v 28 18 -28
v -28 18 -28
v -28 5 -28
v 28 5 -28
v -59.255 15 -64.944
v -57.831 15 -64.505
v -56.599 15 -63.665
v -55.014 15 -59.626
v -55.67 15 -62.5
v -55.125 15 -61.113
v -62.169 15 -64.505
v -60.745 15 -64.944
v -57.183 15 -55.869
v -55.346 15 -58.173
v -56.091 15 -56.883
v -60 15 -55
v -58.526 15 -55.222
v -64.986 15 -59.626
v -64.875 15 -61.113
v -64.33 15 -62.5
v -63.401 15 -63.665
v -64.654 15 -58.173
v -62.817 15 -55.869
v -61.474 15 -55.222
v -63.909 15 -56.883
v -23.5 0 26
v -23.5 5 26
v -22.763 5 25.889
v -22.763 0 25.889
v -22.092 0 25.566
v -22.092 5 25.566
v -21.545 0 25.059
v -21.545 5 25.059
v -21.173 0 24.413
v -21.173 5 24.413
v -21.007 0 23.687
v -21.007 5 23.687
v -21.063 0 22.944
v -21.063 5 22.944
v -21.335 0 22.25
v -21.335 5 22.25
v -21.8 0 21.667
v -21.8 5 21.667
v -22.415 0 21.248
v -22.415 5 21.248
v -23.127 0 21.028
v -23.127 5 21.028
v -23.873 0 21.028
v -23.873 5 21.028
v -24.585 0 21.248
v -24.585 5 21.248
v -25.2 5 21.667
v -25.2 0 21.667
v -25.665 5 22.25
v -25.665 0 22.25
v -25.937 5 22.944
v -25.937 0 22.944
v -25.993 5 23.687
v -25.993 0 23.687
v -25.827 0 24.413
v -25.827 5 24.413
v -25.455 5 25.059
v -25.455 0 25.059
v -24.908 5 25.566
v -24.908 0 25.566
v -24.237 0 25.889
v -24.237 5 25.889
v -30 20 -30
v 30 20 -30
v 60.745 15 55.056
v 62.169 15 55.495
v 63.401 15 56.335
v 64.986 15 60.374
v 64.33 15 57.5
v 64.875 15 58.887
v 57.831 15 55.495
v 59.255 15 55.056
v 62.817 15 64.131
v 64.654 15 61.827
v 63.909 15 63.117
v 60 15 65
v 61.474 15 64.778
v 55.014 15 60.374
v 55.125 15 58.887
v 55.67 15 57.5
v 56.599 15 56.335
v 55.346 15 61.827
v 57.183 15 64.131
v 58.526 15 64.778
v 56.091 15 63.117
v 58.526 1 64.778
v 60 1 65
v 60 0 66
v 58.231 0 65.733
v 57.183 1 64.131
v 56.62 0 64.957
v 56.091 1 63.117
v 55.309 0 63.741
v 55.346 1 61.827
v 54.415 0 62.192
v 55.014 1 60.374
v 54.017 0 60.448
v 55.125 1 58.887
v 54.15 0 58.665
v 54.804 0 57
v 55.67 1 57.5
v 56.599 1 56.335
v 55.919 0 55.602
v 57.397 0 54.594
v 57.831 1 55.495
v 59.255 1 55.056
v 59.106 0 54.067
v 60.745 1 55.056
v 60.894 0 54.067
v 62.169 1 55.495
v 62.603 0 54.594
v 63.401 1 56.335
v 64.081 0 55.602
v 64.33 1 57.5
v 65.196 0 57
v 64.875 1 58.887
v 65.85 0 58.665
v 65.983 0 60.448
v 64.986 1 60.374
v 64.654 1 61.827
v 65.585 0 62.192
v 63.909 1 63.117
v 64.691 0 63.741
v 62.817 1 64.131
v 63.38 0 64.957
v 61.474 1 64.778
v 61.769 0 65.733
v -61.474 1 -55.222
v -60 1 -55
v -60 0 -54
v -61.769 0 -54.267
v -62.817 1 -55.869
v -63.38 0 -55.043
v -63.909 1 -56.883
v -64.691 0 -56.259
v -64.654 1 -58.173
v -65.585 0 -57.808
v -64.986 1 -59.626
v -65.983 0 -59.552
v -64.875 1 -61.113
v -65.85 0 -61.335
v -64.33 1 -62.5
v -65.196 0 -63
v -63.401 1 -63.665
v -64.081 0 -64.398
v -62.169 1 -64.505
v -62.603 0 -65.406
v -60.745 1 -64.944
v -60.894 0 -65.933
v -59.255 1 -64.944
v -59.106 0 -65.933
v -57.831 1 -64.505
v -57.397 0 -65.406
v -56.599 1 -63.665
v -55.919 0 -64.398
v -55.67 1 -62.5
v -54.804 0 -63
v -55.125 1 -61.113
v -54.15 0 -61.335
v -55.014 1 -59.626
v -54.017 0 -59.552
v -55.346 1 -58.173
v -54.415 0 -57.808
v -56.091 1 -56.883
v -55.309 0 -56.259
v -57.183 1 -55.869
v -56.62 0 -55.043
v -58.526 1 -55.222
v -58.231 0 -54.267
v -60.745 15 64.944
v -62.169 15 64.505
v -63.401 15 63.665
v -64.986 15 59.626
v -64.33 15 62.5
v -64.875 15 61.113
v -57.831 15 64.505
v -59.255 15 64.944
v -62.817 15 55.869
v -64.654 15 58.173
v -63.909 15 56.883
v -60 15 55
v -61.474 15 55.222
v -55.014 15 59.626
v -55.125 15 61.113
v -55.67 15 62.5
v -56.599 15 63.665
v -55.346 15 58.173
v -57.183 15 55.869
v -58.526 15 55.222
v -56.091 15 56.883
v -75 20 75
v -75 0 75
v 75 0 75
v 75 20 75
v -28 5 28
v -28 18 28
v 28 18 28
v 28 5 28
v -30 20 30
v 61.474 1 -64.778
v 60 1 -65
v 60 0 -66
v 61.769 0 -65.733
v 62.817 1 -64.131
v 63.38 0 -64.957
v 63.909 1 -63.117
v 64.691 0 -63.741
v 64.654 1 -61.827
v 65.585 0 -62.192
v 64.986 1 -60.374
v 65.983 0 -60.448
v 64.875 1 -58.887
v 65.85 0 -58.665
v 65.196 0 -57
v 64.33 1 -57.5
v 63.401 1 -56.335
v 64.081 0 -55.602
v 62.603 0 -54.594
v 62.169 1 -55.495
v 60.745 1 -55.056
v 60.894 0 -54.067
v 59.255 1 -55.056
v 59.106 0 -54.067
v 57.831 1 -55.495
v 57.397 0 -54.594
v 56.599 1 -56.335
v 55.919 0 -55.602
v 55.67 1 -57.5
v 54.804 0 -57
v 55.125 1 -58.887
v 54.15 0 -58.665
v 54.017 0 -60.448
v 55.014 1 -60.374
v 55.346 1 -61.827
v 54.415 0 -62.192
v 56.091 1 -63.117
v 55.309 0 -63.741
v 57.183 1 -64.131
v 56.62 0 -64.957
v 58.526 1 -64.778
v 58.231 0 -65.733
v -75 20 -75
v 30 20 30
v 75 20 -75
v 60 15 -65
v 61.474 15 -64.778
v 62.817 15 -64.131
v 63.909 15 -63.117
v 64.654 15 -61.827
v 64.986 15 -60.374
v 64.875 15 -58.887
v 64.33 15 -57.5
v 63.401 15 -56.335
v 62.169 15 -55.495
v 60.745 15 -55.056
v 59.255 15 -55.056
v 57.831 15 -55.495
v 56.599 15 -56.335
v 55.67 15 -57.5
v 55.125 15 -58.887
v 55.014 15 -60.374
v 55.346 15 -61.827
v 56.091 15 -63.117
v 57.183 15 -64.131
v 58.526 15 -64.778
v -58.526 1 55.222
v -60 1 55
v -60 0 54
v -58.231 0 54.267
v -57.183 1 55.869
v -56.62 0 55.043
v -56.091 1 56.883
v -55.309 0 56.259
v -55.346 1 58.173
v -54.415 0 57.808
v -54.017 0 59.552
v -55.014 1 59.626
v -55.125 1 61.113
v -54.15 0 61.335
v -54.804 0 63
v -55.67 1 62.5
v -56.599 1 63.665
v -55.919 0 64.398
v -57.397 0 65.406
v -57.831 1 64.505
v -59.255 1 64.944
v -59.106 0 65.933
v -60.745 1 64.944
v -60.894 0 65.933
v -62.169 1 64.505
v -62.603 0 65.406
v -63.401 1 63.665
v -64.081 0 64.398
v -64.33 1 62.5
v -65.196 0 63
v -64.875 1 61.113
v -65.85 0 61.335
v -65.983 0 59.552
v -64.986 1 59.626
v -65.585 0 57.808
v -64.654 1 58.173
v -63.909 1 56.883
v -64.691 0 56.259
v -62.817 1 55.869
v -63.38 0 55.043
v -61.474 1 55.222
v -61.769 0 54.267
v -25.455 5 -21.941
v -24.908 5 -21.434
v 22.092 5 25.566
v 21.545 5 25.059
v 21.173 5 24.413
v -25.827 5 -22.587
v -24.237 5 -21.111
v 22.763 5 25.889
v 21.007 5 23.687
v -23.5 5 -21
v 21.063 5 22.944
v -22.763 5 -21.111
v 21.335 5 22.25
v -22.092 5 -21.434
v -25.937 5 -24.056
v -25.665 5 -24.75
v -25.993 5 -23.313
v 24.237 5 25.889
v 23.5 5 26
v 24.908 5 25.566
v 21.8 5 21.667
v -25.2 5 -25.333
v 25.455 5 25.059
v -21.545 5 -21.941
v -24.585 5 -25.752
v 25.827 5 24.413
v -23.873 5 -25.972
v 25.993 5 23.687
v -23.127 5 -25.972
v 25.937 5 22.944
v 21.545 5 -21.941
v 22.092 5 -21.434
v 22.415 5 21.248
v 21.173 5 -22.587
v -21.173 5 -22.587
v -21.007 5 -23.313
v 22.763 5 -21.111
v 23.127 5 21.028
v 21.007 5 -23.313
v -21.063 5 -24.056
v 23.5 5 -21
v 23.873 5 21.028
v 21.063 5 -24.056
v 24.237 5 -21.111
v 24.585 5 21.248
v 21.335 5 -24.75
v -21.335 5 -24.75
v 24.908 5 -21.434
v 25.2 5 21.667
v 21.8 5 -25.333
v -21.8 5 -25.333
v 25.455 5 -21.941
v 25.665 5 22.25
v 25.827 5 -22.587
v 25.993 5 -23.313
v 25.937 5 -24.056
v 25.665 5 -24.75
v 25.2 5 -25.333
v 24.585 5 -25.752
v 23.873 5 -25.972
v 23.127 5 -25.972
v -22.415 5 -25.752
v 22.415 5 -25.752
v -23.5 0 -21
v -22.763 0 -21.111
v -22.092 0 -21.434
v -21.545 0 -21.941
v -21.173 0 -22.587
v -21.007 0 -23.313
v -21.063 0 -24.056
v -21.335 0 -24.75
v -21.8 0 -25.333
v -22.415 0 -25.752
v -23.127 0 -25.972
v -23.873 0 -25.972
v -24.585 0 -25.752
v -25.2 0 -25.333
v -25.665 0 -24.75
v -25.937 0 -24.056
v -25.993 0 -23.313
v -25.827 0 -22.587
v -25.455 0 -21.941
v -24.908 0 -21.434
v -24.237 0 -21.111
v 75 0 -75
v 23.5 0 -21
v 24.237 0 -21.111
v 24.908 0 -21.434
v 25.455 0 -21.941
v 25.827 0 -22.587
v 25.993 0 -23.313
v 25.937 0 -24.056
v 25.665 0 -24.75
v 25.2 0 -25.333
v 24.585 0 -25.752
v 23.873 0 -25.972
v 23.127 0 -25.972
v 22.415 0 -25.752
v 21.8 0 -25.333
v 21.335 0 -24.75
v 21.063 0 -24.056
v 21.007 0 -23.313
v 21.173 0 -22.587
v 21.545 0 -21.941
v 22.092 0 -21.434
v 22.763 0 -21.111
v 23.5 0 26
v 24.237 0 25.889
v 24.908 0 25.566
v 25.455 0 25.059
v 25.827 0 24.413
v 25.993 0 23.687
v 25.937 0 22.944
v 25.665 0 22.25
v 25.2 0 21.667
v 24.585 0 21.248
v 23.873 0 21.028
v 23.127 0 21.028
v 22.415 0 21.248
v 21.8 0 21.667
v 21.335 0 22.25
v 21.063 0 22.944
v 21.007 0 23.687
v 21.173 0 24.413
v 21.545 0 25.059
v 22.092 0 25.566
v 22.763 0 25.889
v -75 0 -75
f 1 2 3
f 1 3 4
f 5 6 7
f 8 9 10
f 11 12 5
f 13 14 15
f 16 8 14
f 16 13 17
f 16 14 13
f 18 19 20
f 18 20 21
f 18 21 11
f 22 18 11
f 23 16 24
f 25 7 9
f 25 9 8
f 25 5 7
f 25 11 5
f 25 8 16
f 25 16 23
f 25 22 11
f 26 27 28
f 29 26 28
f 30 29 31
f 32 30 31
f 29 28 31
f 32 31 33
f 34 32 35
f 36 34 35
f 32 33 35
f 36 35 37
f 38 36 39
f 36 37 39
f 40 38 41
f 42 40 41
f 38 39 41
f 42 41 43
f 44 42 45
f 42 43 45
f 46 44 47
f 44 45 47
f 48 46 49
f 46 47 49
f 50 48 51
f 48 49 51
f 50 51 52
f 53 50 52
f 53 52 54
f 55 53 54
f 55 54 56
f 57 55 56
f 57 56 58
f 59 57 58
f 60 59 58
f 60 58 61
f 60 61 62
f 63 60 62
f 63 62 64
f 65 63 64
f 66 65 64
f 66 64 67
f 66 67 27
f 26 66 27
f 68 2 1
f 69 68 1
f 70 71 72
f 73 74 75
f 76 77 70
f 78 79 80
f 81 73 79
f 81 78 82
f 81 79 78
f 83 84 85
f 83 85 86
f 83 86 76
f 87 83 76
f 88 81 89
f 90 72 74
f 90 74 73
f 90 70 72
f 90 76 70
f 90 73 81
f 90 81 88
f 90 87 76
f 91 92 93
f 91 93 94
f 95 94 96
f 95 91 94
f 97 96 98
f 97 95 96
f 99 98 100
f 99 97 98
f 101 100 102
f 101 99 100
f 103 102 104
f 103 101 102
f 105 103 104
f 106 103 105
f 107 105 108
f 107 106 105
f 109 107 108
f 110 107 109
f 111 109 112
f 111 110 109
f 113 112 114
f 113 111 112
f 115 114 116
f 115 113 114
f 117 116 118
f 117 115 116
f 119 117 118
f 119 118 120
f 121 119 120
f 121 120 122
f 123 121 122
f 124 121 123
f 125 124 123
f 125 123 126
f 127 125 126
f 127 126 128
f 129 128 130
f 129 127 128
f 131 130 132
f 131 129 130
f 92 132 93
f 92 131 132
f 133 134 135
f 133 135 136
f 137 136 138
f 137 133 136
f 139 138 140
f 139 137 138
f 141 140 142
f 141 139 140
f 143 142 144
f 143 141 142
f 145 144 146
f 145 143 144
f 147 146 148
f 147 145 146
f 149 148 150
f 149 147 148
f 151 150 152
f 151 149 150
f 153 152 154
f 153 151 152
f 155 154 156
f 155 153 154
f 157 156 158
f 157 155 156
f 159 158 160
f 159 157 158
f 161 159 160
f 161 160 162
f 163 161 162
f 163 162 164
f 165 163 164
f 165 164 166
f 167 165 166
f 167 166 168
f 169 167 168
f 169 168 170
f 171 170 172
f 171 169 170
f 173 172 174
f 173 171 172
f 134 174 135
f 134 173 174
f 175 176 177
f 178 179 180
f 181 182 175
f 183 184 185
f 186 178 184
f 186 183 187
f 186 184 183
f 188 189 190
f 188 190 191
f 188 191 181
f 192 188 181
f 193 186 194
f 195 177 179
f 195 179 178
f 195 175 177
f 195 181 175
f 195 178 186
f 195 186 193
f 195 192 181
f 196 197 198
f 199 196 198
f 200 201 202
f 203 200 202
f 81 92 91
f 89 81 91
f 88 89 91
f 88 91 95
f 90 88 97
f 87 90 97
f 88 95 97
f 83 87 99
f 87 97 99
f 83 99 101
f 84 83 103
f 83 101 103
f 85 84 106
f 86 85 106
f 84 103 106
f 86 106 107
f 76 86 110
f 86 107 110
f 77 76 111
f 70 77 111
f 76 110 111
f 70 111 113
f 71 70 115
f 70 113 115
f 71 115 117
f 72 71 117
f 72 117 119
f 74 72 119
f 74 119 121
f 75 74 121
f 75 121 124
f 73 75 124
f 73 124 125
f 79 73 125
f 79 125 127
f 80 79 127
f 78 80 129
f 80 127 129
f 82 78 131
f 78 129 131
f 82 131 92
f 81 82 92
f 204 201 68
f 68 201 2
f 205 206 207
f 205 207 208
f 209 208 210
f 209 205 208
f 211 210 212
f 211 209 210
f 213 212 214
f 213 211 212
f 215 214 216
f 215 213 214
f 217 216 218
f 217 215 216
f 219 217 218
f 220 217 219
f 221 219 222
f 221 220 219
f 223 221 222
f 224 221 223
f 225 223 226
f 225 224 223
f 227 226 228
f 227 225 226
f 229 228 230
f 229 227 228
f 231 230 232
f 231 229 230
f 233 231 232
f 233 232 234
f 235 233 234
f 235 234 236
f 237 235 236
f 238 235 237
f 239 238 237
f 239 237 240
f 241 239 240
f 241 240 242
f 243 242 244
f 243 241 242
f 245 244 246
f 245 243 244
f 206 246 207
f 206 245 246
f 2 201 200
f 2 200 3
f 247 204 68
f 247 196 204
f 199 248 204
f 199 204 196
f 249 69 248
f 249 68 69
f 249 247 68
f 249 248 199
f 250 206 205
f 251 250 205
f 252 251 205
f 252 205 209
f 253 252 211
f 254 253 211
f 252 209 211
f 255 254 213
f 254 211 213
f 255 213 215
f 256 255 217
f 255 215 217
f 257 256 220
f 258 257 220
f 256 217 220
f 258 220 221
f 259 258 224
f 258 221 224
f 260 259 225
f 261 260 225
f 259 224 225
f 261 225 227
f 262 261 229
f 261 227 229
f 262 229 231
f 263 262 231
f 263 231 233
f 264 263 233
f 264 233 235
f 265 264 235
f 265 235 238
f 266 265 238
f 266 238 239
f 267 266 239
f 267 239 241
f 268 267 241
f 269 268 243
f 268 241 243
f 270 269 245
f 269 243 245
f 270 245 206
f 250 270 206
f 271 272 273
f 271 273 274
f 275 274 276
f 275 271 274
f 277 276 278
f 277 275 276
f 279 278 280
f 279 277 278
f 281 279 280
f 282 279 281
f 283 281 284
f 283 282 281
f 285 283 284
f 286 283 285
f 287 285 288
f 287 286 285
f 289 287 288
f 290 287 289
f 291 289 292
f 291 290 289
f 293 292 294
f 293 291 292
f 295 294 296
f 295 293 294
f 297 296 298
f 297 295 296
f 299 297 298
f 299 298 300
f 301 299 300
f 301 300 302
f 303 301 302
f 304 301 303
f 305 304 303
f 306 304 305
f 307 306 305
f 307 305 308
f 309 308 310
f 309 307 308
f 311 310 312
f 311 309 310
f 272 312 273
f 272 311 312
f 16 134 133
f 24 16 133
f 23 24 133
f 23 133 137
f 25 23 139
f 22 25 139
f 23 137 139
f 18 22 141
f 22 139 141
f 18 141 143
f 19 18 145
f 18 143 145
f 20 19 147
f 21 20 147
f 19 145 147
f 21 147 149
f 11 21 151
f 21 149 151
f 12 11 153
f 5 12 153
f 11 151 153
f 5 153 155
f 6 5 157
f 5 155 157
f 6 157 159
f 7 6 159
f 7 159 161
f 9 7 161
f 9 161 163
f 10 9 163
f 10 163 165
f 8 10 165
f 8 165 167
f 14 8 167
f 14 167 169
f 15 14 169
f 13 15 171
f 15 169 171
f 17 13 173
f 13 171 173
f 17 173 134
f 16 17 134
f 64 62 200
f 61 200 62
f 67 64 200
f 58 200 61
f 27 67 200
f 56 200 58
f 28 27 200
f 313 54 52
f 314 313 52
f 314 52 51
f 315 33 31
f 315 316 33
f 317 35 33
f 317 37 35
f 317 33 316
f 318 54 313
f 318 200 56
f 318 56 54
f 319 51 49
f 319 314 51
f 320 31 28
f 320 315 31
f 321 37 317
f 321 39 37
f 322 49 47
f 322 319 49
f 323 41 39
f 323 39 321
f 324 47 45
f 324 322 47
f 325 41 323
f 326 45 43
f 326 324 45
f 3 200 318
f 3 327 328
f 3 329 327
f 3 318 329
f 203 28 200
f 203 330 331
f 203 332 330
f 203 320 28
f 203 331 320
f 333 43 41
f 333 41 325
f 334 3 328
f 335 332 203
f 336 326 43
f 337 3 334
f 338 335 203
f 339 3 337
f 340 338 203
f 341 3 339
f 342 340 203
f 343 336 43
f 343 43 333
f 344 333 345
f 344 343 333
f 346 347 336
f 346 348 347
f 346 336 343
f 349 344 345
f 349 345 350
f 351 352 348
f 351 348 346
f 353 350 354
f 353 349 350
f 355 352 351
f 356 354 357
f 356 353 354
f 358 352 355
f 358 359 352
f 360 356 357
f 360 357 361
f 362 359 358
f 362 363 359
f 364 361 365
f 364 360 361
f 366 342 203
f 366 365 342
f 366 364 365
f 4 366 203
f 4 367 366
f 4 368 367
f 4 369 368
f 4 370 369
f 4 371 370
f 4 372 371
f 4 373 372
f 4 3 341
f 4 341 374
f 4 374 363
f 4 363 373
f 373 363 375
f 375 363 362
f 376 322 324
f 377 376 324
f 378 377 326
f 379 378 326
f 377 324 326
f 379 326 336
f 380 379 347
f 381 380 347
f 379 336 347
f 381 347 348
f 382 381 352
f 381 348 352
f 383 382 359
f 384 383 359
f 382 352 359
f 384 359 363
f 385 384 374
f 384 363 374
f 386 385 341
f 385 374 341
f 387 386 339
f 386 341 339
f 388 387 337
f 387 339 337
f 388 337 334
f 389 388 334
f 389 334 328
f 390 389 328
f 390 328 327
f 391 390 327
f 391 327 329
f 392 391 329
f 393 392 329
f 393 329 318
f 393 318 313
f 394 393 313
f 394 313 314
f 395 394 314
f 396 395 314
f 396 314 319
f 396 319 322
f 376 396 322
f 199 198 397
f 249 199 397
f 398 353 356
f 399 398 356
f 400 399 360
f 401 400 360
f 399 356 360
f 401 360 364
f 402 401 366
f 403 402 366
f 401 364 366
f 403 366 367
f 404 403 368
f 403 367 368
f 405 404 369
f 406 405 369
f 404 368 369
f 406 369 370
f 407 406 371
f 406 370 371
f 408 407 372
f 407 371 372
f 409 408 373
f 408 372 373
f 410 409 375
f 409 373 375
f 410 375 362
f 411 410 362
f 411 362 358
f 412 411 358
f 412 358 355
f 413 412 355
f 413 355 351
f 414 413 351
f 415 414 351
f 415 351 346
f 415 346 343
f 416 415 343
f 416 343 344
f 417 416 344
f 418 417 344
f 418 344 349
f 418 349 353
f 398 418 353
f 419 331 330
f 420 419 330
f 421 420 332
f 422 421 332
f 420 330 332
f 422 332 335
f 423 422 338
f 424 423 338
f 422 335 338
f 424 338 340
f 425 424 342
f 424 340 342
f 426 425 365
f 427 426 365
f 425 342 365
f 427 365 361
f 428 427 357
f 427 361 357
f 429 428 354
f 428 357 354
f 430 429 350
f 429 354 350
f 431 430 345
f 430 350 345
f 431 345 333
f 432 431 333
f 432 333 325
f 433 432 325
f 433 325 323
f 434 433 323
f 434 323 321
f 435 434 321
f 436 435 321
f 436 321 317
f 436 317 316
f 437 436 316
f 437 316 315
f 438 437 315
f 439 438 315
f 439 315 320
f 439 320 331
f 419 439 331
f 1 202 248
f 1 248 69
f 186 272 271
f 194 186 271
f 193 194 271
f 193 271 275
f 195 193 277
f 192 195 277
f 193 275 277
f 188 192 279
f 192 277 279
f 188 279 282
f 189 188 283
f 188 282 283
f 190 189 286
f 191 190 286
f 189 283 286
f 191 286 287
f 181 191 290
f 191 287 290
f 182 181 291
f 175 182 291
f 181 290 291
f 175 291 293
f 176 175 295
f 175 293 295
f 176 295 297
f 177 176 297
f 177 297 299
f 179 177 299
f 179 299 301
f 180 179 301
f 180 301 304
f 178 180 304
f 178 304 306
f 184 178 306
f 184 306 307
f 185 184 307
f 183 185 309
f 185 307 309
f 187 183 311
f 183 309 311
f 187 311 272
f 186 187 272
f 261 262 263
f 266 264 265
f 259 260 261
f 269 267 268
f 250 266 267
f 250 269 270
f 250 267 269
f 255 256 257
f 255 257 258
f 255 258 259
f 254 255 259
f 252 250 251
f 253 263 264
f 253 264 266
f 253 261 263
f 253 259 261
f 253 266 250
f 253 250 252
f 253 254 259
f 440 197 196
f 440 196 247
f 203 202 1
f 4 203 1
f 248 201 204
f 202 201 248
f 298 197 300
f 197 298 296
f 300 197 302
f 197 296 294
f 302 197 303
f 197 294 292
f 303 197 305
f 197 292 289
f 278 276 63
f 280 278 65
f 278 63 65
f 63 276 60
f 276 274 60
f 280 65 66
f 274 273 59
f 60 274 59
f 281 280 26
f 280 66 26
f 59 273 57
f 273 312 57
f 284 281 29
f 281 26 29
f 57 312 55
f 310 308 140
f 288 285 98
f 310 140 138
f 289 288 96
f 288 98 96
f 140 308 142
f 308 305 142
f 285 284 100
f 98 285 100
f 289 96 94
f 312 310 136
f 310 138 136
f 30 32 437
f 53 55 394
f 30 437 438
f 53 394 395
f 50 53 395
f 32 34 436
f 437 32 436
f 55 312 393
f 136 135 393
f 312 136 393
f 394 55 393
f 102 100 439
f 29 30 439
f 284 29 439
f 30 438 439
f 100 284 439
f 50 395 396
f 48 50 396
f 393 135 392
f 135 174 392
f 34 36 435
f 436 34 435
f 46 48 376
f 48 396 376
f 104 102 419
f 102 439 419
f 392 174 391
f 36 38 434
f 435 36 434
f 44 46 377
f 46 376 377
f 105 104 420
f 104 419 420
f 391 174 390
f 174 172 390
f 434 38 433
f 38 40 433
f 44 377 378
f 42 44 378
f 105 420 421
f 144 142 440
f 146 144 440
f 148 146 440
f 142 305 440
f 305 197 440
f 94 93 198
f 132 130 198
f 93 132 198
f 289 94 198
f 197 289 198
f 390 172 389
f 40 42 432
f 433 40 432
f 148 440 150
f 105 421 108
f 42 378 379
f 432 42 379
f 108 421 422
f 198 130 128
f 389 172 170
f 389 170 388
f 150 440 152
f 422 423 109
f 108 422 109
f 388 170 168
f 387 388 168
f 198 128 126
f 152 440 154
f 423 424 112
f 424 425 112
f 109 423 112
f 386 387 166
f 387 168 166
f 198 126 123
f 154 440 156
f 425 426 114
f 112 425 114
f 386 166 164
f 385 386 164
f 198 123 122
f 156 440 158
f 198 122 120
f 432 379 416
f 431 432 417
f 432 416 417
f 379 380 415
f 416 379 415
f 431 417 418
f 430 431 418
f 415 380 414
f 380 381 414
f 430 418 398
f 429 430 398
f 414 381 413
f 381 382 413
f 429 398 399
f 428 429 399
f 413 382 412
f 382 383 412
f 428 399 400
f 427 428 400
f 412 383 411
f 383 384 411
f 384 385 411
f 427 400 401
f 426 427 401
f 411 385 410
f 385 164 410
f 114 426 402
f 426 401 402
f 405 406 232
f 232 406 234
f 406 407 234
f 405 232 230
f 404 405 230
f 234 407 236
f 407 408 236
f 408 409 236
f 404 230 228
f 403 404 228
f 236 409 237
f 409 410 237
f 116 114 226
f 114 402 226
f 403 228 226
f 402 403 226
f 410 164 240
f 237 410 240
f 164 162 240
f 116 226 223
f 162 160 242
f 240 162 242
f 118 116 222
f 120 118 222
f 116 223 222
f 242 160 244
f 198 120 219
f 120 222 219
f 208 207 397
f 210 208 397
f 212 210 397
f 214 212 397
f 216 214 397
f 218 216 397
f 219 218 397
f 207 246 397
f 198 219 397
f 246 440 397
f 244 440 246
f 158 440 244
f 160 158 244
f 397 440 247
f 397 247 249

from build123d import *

# Parameters (mm, degrees)
SCHIZZO1_W                   = 150
SCHIZZO1_H                   = 150
ESTRUSIONE_ESTRUSIONE1_DEPTH = 20
SCHIZZO2_W                   = 56
SCHIZZO2_H                   = 56
TAGLIO_ESTRUSIONE1_DEPTH     = 15
SCHIZZO3_R                   = 2.5
TAGLIO_ESTRUSIONE2_DEPTH     = 15
SMUSSO1_SIZE                 = 2
SCHIZZO4_R                   = 5
TAGLIO_ESTRUSIONE3_DEPTH     = 15
SMUSSO2_SIZE                 = 1


with BuildPart() as part:
    # Schizzo1 → Estrusione-Estrusione1 (new body)
    with BuildSketch(Plane(origin=(0, 0, 0), x_dir=(1, 0, 0), z_dir=(0, 1, 0))):
        Rectangle(SCHIZZO1_W, SCHIZZO1_H)
    extrude(amount=ESTRUSIONE_ESTRUSIONE1_DEPTH)

    # Schizzo2 → Taglio-Estrusione1 (cut)
    with BuildSketch(Plane(origin=(0, 20, 0), x_dir=(1, 0, 0), z_dir=(0, 1, 0))):
        Rectangle(SCHIZZO2_W, SCHIZZO2_H)
    extrude(amount=-TAGLIO_ESTRUSIONE1_DEPTH, mode=Mode.SUBTRACT)

    # Schizzo3 → Taglio-Estrusione2 (cut)
    with BuildSketch(Plane(origin=(0, 5, 0), x_dir=(1, 0, 0), z_dir=(0, 1, 0))):
        with Locations(Location((23.5, 23.5, 0), (0, 0, 270))):
            Circle(SCHIZZO3_R)
        with Locations(Location((-23.5, 23.5, 0), (0, 0, 270))):
            Circle(SCHIZZO3_R)
        with Locations(Location((-23.5, -23.5, 0), (0, 0, 270))):
            Circle(SCHIZZO3_R)
        with Locations(Location((23.5, -23.5, 0), (0, 0, 270))):
            Circle(SCHIZZO3_R)
    extrude(amount=-TAGLIO_ESTRUSIONE2_DEPTH, mode=Mode.SUBTRACT)

    # Smusso1
    smusso1_edges = [part.edges().sort_by_distance(p)[0] for p in [
        (28, 20, 0),
        (0, 20, -28),
        (-28, 20, 0),
        (0, 20, 28),
    ]]
    chamfer(smusso1_edges, length=SMUSSO1_SIZE)

    # Schizzo4 → Taglio-Estrusione3 (cut)
    with BuildSketch(Plane(origin=(0, 0, 0), x_dir=(-1, 0, 0), z_dir=(0, -1, 0))):
        with Locations(Location((60, -60, 0), (0, 0, 90))):
            Circle(SCHIZZO4_R)
        with Locations(Location((-60, -60, 0), (0, 0, 270))):
            Circle(SCHIZZO4_R)
        with Locations(Location((-60, 60, 0), (0, 0, 90))):
            Circle(SCHIZZO4_R)
        with Locations(Location((60, 60, 0), (0, 0, 270))):
            Circle(SCHIZZO4_R)
    extrude(amount=-TAGLIO_ESTRUSIONE3_DEPTH, mode=Mode.SUBTRACT)

    # Smusso2
    smusso2_edges = [part.edges().sort_by_distance(p)[0] for p in [
        (-60, 0, 65),
        (60, 0, 55),
        (60, 0, -55),
        (-60, 0, -65),
    ]]
    chamfer(smusso2_edges, length=SMUSSO2_SIZE)


solid = part.part
